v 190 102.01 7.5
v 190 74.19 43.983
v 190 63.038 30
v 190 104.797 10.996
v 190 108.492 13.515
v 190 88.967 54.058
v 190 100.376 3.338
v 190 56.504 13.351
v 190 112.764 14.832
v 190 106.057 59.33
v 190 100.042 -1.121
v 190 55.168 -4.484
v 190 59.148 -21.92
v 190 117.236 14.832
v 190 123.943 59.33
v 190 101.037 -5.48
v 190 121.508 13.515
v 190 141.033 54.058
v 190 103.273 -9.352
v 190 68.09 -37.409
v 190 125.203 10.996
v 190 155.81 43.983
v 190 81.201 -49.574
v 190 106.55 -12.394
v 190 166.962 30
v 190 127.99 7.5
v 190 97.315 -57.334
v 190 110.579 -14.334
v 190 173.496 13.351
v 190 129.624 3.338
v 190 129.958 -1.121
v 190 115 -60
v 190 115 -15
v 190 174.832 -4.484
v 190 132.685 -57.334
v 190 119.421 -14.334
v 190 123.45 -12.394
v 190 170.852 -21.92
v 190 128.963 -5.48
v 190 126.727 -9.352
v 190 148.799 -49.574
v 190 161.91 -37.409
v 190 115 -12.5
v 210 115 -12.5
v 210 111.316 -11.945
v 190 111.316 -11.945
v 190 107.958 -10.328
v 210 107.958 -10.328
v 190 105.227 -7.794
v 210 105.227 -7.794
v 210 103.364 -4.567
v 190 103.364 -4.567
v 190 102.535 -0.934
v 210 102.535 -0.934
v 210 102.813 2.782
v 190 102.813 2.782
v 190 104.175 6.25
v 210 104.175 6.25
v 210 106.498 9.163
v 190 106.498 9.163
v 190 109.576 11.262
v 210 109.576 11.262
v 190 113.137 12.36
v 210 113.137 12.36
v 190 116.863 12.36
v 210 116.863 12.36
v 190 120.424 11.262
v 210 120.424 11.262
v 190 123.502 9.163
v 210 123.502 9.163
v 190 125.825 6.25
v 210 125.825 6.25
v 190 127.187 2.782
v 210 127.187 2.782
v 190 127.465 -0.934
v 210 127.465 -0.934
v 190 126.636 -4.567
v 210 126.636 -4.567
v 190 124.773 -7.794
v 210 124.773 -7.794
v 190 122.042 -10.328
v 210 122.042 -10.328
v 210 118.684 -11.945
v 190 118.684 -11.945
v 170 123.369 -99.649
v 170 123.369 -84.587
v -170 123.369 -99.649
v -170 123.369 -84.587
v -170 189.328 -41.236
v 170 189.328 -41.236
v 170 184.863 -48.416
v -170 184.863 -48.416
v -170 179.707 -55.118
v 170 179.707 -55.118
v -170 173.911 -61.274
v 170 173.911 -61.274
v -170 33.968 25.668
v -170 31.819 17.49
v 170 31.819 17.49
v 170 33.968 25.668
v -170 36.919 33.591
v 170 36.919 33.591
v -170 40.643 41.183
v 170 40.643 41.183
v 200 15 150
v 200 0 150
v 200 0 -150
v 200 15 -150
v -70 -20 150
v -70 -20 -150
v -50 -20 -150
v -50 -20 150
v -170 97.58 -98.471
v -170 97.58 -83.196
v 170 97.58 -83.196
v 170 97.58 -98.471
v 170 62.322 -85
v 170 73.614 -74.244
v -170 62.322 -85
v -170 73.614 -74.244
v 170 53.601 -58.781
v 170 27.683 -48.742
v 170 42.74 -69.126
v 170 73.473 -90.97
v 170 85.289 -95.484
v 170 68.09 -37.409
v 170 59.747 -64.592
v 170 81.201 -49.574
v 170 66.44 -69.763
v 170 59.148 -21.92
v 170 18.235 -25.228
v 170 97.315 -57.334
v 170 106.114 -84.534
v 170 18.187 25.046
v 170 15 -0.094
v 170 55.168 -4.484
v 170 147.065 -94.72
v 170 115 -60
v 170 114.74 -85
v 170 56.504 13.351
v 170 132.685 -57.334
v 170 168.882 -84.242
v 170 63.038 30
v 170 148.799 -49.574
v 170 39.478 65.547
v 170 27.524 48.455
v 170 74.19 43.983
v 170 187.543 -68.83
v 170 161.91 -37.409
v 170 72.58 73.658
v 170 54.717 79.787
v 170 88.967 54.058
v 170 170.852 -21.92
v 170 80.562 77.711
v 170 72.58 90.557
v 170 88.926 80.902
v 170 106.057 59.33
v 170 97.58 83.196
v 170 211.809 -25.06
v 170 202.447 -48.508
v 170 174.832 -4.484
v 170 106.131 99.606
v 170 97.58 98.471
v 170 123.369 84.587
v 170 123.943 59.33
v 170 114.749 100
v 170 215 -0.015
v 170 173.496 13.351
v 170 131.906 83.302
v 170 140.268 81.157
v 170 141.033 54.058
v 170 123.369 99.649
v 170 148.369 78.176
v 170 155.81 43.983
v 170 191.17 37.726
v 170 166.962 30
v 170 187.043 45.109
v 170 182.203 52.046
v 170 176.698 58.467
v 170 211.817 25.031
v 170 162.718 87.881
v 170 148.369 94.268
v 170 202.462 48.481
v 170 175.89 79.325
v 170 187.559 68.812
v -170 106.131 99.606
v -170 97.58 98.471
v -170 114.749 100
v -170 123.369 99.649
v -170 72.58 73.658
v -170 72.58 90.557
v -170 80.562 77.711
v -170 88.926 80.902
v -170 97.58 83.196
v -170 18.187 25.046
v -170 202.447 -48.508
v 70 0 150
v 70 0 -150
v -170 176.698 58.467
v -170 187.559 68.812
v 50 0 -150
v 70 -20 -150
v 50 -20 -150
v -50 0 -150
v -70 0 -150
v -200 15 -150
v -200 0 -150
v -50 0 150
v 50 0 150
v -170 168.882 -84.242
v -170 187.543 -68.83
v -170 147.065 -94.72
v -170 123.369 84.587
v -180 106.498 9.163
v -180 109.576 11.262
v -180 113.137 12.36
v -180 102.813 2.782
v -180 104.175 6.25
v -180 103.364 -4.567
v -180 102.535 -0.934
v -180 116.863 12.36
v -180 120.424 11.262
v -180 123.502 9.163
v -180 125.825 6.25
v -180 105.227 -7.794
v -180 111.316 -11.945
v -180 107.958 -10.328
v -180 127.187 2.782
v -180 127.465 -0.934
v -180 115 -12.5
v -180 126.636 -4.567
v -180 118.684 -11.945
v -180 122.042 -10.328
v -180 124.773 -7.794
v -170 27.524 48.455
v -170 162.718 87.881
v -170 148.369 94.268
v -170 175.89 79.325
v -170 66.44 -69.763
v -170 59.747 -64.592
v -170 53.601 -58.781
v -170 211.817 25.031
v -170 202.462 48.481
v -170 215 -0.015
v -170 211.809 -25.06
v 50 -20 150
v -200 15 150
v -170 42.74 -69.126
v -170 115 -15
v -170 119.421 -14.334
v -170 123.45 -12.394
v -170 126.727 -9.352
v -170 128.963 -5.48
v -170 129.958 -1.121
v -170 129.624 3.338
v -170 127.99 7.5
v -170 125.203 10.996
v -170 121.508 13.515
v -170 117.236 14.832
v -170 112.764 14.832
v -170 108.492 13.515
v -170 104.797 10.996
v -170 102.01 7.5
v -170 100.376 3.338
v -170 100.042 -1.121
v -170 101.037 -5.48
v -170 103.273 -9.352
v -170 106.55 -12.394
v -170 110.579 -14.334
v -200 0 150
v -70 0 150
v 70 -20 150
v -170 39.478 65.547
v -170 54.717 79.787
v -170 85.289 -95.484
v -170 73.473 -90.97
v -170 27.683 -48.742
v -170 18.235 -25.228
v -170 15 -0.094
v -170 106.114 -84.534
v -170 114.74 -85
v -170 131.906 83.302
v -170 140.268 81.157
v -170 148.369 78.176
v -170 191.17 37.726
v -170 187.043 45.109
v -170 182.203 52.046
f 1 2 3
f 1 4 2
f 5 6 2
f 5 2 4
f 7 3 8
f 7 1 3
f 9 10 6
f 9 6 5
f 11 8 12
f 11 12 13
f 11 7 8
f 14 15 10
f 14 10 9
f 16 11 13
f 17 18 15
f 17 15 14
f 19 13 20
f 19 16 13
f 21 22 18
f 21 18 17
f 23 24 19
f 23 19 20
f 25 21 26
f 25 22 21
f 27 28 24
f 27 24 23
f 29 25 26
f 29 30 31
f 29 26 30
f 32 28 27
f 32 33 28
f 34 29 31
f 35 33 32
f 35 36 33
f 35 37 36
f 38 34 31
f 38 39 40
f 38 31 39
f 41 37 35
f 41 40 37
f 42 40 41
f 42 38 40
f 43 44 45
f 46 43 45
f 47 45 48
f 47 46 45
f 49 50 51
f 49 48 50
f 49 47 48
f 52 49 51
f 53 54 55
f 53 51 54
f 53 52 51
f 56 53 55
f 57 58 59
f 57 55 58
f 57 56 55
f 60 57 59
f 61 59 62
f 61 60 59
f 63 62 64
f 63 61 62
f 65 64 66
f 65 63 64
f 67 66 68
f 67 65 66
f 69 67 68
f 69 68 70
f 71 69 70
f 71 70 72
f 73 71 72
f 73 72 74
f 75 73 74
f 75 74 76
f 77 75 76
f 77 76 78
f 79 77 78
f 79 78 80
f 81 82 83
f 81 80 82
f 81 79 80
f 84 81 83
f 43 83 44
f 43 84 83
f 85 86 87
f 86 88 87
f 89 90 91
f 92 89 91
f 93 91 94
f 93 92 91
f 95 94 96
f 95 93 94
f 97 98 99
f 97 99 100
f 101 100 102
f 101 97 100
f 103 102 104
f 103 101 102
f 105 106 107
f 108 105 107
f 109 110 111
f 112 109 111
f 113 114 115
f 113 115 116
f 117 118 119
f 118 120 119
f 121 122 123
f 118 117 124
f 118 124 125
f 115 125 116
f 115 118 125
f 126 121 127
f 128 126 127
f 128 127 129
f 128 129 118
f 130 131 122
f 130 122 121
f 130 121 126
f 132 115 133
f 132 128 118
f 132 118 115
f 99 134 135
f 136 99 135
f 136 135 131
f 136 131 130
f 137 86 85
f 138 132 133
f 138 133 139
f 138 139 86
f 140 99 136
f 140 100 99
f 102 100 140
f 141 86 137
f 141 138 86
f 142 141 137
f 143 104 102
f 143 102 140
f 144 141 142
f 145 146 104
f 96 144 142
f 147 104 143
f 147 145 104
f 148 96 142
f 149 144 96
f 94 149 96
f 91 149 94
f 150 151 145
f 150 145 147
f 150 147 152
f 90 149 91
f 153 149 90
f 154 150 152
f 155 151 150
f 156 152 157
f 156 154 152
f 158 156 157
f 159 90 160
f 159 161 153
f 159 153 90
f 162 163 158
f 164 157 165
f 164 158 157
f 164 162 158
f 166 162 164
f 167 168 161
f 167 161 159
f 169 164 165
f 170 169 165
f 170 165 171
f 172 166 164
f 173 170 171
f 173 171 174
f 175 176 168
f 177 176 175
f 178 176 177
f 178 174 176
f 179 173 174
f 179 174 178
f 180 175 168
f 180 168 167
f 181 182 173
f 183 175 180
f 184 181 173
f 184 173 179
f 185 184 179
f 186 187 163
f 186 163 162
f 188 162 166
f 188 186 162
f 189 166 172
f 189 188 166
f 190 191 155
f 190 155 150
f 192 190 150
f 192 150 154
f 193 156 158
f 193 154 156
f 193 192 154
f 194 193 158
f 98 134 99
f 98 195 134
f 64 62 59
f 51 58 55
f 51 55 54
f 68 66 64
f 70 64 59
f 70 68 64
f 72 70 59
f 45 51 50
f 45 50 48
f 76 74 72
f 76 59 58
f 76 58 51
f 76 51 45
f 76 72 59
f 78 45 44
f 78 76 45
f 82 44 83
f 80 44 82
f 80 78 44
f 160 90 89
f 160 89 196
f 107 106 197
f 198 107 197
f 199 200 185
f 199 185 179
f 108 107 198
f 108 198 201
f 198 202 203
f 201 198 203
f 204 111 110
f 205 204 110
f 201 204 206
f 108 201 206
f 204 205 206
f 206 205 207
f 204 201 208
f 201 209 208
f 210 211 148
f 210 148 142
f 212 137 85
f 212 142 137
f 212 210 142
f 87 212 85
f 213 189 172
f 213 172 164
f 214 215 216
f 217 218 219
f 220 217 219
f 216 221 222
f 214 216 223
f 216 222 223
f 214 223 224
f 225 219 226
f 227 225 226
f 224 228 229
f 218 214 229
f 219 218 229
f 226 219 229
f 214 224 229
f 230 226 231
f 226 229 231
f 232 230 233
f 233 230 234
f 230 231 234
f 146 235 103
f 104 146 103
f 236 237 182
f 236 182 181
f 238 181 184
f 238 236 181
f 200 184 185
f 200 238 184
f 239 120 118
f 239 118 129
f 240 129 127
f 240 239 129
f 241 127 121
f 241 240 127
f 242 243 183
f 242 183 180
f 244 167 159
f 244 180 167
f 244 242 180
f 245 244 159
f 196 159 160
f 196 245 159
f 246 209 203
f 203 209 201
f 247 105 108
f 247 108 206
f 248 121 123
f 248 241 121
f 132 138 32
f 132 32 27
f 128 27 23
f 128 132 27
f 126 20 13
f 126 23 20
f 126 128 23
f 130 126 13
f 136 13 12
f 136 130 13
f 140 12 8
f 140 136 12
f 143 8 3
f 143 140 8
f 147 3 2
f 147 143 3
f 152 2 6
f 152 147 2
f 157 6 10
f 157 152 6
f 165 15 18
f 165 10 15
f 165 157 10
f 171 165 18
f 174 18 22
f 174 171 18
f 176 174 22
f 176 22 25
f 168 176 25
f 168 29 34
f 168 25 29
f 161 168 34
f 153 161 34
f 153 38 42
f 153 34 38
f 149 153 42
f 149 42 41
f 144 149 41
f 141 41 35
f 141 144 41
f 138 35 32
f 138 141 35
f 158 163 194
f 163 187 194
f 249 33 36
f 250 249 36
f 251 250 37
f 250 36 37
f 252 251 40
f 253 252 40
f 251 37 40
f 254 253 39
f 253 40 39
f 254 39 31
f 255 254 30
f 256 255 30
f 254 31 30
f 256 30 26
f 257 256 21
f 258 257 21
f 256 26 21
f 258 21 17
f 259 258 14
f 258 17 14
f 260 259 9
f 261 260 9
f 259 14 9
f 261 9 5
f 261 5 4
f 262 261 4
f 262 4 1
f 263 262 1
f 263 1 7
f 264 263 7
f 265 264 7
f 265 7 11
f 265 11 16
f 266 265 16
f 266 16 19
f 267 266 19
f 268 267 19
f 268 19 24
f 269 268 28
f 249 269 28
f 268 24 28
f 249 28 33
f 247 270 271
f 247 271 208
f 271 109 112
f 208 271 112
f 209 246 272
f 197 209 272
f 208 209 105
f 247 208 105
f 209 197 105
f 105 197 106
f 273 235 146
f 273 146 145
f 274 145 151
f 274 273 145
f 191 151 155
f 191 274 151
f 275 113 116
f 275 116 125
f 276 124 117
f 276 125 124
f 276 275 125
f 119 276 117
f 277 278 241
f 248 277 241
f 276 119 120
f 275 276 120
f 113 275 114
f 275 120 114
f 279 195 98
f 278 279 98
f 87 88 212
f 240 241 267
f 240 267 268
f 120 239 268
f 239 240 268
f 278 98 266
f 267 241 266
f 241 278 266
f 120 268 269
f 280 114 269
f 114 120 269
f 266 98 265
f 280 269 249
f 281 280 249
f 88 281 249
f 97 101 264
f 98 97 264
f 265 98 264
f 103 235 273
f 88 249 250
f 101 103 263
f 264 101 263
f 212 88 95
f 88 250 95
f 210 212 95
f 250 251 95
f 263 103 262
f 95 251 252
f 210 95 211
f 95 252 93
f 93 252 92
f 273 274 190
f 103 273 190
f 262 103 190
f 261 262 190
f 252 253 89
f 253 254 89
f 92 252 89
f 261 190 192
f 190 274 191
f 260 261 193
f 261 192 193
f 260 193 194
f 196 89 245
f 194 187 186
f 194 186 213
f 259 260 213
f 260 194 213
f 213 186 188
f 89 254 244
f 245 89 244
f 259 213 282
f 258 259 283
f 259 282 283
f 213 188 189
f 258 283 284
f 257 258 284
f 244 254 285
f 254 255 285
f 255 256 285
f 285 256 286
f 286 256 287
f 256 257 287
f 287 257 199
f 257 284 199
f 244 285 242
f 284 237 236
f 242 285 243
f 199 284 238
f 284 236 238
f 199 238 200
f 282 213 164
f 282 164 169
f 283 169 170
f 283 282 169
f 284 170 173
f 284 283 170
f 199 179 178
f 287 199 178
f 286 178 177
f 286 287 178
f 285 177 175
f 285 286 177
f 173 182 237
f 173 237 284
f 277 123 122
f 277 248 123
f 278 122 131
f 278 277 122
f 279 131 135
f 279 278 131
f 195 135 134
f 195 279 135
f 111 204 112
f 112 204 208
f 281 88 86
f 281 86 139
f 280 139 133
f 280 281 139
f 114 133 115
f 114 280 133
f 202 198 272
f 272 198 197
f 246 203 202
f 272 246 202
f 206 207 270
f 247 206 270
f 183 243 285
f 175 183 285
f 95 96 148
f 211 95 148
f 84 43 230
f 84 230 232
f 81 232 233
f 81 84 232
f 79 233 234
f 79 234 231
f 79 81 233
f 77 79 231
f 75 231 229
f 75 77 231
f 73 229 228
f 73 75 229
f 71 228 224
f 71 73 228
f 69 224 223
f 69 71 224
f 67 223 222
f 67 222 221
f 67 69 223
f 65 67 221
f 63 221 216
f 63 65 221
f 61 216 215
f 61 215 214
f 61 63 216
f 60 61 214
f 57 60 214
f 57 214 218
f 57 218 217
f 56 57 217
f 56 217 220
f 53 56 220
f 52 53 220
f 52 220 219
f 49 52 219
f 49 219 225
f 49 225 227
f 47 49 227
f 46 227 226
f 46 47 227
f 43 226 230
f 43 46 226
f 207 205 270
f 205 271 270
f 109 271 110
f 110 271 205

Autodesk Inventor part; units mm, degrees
ref_plane "YZ Plane" through (0, 0, 0) normal (1, 0, 0) x (0, 1, 0)
ref_plane "XZ Plane" through (0, 0, 0) normal (0, 1, 0) x (-1, 0, 0)
ref_plane "XY Plane" through (0, 0, 0) normal (0, 0, 1) x (1, 0, 0)
sketch "Boceto1" plane through (0, 0, 0) normal (0, 1, 0) x (-1, 0, 0)
  line L0 (200, 150) -> (-200, 150)
  line L1 (-200, 150) -> (-200, -150)
  line L2 (-200, -150) -> (200, -150)
  line L3 (200, -150) -> (200, 150)
  point P0 (0, 0)
  point P1 (200, 0)
  point P2 (0, -150)
  dimension "d0" = 300
  dimension "d1" = 400
extrude "Extrusión1" add sketch "Boceto1" along normal blind 15
sketch "Boceto2" plane through (0, 0, 0) normal (1, 0, 0) x (0, 1, 0)
  line L0 (0, -150) -> (0, 150) construction
  line L1 (0, 150) -> (15, 150) construction
  line L2 (15, -150) -> (15, 150) construction
  line L3 (0, -150) -> (15, -150) construction
  circle A0 centre (115, 0) radius 85
  line L4 (187.5593, 68.8124) -> (176.6978, 58.467)
  line L5 (202.4618, 48.4812) -> (191.1695, 37.7255)
  line L6 (73.6141, -74.2442) -> (62.3217, -85)
  line L7 (27.5235, 48.4548) -> (40.6428, 41.1826)
  line L8 (189.3279, -41.2355) -> (202.4471, -48.5077)
  line L9 (123.3693, 99.6492) -> (123.3693, 84.587)
  line L10 (148.3693, 94.2682) -> (148.3693, 78.176)
  line L11 (148.3693, -78.176) -> (148.3693, -94.2682)
  line L12 (173.9112, -61.2738) -> (187.5427, -68.8299)
  line L13 (123.3693, -84.587) -> (123.3693, -99.6492)
  line L14 (97.5795, 98.4709) -> (97.5795, 83.1957)
  line L15 (72.5795, 90.5566) -> (72.5795, 73.658)
  line L16 (72.5795, -73.658) -> (72.5795, -75.2297)
  line L17 (18.1873, 25.046) -> (31.8189, 17.4899)
  line L18 (53.6011, -58.7807) -> (42.7395, -69.1261)
  line L19 (97.5795, -83.1957) -> (97.5795, -98.4709)
  arc A1 (187.5593, 68.8124) -> (148.3693, 94.2682) centre (115, 0) ccw
  arc A2 (123.3693, 99.6492) -> (97.5795, 98.4709) centre (115, 0) ccw
  arc A3 (72.5795, 90.5566) -> (27.5235, 48.4548) centre (115, 0) ccw
  arc A4 (18.1873, 25.046) -> (42.7395, -69.1261) centre (115, 0) ccw
  arc A5 (62.3217, -85) -> (97.5795, -98.4709) centre (115, 0) ccw
  arc A6 (123.3693, -99.6492) -> (187.5427, -68.8299) centre (115, 0) ccw
  arc A7 (202.4471, -48.5077) -> (202.4618, 48.4812) centre (115, 0) ccw
  point P0 (0, 0)
  point P1 (0, 0)
  dimension "d5" = 170
extrude "Extrusión2" add sketch "Boceto2" along normal mid plane 340 contours A0 | A0 L5 A7 L8 | A0 L10 A1 L4 | L12 A6 L11 A0 | L11 A6 L13 A0 | A0 L14 A2 L9 | L19 A5 L6 A0 | A0 L7 A3 L15 | A0 L18 A4 L17
sketch "Boceto3" plane through (170, 0, 0) normal (1, 0, 0) x (0, 0, -1)
  line L0 (-48.4812, 202.4618) -> (-37.7255, 191.1695) construction
  arc A0 (-37.7255, 191.1695) -> (-58.467, 176.6978) centre (0, 115) ccw construction
  line L1 (-58.467, 176.6978) -> (-68.8124, 187.5593) construction
  arc A1 (-68.8124, 187.5593) -> (-94.2682, 148.3693) centre (0, 115) ccw construction
  line L2 (-94.2682, 148.3693) -> (-78.176, 148.3693) construction
  arc A2 (-78.176, 148.3693) -> (-84.587, 123.3693) centre (0, 115) ccw construction
  line L3 (-84.587, 123.3693) -> (-99.6492, 123.3693) construction
  arc A3 (-99.6492, 123.3693) -> (-98.4709, 97.5795) centre (0, 115) ccw construction
  line L4 (-98.4709, 97.5795) -> (-83.1957, 97.5795) construction
  arc A4 (-83.1957, 97.5795) -> (-73.658, 72.5795) centre (0, 115) ccw construction
  line L5 (-73.658, 72.5795) -> (-90.5566, 72.5795) construction
  arc A5 (-90.5566, 72.5795) -> (-48.4548, 27.5235) centre (0, 115) ccw construction
  line L6 (-48.4548, 27.5235) -> (-41.1826, 40.6428) construction
  arc A6 (-41.1826, 40.6428) -> (-17.4899, 31.8189) centre (0, 115) ccw construction
  line L7 (-17.4899, 31.8189) -> (-25.046, 18.1873) construction
  arc A7 (-25.046, 18.1873) -> (0, 15) centre (0, 115) ccw construction
  arc A8 (0, 15) -> (69.1261, 42.7395) centre (0, 115) ccw construction
  line L8 (69.1261, 42.7395) -> (58.7807, 53.6011) construction
  arc A9 (58.7807, 53.6011) -> (74.2442, 73.6141) centre (0, 115) ccw construction
  line L9 (74.2442, 73.6141) -> (85, 62.3217) construction
  arc A10 (85, 62.3217) -> (98.4709, 97.5795) centre (0, 115) ccw construction
  line L10 (98.4709, 97.5795) -> (83.1957, 97.5795) construction
  arc A11 (83.1957, 97.5795) -> (84.587, 123.3693) centre (0, 115) ccw construction
  line L11 (84.587, 123.3693) -> (99.6492, 123.3693) construction
  arc A12 (99.6492, 123.3693) -> (68.8299, 187.5427) centre (0, 115) ccw construction
  line L12 (68.8299, 187.5427) -> (61.2738, 173.9112) construction
  arc A13 (61.2738, 173.9112) -> (41.2355, 189.3279) centre (0, 115) ccw construction
  line L13 (41.2355, 189.3279) -> (48.5077, 202.4471) construction
  arc A14 (48.5077, 202.4471) -> (-48.4812, 202.4618) centre (0, 115) ccw construction
  circle A15 centre (0, 115) radius 60
  line L14 (-150, 15) -> (150, 15) projected
  point P0 (0, 0)
  dimension "d14" = 120
  dimension "d15" = 100
extrude "Extrusión3" add sketch "Boceto3" along normal blind 20
sketch "Boceto4" plane through (190, 115, 0) normal (1, 0, 0) x (0, 0, -1)
  circle A0 centre (0, 0) radius 15
  circle A1 centre (0, 0) radius 60 construction
  point P0 (0, -115)
  dimension "d18" = 30
extrude "Extrusión4" cut sketch "Boceto4" against normal through all
sketch "Boceto5" plane through (190, 115, 0) normal (1, 0, 0) x (0, 0, -1)
  circle A0 centre (0, 0) radius 15 construction
  circle A1 centre (0, 0) radius 60 construction
  circle A2 centre (0, 0) radius 12.5
  point P0 (0, -115)
  dimension "d21" = 25
extrude "Extrusión5" add sketch "Boceto5" along normal blind 20 and the other way blind 370
sketch "Boceto7" plane through (0, 0, 0) normal (0, -1, 0) x (1, 0, 0)
  line L0 (200, 150) -> (200, -150) construction
  line L1 (-200, 150) -> (200, 150) construction
  line L2 (-200, -150) -> (-200, 150) construction
  line L3 (200, -150) -> (-200, -150) construction
  line L4 (-200, 150) -> (200, 150) construction
  line L5 (-50, 150) -> (50, 150) construction
  line L6 (50, 150) -> (50, -150) construction
  line L7 (50, -150) -> (-50, -150) construction
  line L8 (-50, -150) -> (-50, 150) construction
  line L9 (200, -150) -> (-200, -150) projected
  line L10 (-50, 150) -> (-70, 150)
  line L11 (-70, 150) -> (-70, -150)
  line L12 (-70, -150) -> (-50, -150)
  line L13 (-50, -150) -> (-50, 150)
  line L14 (50, -150) -> (70, -150)
  line L15 (70, -150) -> (70, 150)
  line L16 (70, 150) -> (50, 150)
  line L17 (50, 150) -> (50, -150)
  point P0 (0, 0)
  point P1 (0, -150)
  dimension "d30" = 100
  dimension "d31" = 0
  dimension "d32" = 20
  dimension "d33" = 20
extrude "Extrusión7" add sketch "Boceto7" along normal blind 20
properties part number "motor"
